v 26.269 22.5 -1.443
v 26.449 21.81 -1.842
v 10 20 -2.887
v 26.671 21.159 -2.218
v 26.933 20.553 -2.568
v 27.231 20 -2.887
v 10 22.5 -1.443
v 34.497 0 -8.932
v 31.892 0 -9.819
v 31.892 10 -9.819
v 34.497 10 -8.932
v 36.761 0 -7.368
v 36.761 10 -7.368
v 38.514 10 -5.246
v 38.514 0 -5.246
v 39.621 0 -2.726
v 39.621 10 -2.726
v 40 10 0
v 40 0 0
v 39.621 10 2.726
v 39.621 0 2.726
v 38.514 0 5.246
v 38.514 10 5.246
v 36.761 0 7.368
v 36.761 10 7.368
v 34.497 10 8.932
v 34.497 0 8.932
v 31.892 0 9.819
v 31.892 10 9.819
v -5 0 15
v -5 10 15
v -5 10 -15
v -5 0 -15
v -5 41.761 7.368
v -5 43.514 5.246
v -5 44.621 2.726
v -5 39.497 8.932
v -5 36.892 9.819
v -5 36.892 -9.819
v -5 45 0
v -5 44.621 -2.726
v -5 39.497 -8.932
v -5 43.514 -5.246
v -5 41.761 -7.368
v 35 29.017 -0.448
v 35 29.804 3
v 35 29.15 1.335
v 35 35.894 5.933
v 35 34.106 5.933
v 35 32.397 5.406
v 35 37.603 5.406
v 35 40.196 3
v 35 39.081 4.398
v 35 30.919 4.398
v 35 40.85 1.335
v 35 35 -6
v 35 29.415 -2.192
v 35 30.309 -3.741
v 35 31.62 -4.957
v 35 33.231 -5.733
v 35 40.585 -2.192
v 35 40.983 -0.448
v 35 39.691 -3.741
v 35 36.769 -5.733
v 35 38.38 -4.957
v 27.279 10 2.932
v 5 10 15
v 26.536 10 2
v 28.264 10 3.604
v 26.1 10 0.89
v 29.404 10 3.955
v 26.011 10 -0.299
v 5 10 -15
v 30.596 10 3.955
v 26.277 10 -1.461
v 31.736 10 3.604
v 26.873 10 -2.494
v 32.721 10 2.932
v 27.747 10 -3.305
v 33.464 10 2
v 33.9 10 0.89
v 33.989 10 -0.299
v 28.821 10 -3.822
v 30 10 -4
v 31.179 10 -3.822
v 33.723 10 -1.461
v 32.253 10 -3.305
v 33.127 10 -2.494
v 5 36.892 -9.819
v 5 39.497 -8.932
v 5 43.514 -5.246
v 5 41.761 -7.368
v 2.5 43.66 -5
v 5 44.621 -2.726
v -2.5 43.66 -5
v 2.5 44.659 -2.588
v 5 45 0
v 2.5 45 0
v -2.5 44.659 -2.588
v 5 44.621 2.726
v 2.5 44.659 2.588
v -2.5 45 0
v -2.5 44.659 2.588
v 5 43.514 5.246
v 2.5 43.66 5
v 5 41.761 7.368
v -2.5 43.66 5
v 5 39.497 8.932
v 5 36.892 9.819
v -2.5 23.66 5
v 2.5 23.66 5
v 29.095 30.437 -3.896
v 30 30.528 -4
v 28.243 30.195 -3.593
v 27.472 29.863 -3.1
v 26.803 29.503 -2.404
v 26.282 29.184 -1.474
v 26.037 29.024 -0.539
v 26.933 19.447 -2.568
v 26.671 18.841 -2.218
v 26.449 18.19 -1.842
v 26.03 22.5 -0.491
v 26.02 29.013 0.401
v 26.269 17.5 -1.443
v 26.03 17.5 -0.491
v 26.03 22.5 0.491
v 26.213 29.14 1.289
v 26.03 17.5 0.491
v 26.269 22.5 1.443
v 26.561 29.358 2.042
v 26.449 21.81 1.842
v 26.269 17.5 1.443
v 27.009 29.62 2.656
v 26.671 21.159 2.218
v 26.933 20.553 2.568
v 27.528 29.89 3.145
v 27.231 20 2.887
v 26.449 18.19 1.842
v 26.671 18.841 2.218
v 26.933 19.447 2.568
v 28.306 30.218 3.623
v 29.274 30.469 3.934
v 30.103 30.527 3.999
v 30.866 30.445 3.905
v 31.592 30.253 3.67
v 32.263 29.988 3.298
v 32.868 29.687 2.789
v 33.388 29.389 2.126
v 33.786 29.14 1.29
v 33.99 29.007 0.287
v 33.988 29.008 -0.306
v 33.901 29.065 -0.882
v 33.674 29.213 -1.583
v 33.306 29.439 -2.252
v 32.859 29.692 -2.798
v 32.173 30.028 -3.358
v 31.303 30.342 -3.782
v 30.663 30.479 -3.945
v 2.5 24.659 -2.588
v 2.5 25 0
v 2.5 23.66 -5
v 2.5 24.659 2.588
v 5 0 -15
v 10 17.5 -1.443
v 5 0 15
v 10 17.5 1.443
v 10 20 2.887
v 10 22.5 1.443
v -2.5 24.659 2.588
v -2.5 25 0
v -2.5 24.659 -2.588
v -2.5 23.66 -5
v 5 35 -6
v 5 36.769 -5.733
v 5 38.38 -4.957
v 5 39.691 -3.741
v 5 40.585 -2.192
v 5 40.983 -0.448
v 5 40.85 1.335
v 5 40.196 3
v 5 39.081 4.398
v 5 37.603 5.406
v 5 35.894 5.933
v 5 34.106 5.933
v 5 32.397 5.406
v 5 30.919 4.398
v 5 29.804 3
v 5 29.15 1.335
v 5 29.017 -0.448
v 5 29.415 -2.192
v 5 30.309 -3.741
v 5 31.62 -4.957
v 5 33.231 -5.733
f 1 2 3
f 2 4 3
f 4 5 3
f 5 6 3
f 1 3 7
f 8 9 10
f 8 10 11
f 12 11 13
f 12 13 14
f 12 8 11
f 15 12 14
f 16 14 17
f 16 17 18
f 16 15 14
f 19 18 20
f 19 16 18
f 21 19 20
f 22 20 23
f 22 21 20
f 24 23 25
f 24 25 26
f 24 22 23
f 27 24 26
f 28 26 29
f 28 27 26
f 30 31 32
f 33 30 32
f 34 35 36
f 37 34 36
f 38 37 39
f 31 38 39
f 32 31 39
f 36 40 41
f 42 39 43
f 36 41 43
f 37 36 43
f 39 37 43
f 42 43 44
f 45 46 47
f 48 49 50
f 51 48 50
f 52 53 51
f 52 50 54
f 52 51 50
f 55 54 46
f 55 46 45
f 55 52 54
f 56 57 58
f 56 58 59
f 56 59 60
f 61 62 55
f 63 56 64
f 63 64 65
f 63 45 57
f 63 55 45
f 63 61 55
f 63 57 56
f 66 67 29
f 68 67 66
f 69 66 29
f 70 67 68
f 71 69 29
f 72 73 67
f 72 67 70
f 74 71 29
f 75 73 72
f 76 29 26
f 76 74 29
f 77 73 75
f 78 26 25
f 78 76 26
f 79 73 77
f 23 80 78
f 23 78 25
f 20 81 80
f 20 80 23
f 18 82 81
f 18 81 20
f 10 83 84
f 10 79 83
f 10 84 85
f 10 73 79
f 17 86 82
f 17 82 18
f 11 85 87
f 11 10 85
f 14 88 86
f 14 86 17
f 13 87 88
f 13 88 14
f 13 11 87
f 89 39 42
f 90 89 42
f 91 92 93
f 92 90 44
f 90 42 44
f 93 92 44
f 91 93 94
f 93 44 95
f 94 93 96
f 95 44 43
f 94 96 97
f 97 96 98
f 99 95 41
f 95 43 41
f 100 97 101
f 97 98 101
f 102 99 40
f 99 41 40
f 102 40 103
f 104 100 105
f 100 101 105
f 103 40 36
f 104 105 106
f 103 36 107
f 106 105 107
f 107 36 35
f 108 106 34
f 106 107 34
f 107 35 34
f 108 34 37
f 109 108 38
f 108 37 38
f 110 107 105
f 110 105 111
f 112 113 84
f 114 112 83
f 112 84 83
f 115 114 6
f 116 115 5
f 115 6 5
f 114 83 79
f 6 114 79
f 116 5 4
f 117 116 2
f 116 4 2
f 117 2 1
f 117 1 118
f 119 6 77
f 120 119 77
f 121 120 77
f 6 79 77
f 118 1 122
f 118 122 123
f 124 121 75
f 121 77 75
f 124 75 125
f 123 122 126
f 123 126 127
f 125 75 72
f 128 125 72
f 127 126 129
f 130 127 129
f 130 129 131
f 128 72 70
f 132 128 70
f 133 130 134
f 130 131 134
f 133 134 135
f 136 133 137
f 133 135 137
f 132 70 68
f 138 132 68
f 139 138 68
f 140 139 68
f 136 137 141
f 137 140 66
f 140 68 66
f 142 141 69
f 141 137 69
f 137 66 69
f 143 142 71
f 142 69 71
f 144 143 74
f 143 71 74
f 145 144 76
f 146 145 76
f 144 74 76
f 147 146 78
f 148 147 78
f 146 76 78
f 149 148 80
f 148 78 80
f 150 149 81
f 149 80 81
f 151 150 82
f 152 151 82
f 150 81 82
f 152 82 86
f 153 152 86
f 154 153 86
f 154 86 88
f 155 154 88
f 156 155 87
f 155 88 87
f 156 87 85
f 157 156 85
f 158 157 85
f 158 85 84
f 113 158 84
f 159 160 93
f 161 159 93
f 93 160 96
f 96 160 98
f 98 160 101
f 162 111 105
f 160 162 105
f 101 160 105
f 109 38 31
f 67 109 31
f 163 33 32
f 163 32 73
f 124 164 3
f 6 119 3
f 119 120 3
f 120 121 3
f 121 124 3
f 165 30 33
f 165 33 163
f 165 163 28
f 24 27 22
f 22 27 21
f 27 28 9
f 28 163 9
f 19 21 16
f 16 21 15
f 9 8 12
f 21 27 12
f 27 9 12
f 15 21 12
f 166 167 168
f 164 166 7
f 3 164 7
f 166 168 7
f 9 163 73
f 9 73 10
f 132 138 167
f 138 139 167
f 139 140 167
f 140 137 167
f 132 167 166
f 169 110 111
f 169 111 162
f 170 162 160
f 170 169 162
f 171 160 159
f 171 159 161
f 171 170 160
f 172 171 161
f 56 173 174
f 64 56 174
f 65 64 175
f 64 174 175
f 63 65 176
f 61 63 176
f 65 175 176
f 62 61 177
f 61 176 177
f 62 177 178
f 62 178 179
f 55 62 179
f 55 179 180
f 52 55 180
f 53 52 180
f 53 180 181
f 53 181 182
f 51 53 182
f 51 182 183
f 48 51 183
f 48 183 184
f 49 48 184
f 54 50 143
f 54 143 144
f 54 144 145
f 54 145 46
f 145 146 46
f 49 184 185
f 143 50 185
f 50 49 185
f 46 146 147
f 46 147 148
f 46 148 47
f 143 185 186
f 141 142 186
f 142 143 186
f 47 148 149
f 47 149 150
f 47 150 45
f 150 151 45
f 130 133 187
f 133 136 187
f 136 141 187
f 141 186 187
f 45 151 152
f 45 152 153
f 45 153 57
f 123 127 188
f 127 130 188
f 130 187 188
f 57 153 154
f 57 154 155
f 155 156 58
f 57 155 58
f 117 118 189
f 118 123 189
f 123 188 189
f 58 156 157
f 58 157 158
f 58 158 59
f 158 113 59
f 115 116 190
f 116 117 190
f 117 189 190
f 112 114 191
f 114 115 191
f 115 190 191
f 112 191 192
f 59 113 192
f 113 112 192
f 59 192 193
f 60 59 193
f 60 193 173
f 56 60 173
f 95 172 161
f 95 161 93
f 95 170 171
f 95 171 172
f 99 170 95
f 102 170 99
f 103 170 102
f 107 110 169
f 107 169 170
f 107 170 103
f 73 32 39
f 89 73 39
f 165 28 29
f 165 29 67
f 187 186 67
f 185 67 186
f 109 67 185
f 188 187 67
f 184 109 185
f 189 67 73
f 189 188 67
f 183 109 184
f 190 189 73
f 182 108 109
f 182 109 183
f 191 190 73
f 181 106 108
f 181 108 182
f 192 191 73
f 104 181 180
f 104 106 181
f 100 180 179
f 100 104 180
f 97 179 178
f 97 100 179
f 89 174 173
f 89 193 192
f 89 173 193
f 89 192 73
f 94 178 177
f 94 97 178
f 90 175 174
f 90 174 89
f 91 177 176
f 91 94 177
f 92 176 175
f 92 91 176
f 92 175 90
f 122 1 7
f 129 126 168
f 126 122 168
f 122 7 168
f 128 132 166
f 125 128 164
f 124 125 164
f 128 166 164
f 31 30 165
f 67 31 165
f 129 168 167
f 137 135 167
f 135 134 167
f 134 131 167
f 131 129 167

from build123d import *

# Parameters (mm, degrees)
SKETCH1_W                = 10
SKETCH1_H                = 30
BOSS_EXTRUDE1_DEPTH      = 10
BOSS_EXTRUDE2_DEPTH      = 10
SKETCH4_R                = 6
BOSS_EXTRUDE3_DEPTH      = 30
BOSS_EXTRUDE4_REACH      = 57.227
BOSS_EXTRUDE4_END_RADIUS = 6
SKETCH5_R                = 4
BOSS_EXTRUDE5_REACH      = 60.949
BOSS_EXTRUDE5_END_RADIUS = 4
SKETCH7_W                = 9.610963381
SKETCH7_H                = 7.741253353
CUT_EXTRUDE1_DEPTH       = 5
CUT_EXTRUDE2_START       = -2.5
CUT_EXTRUDE2_DEPTH       = 5


# Read off the part's stored shape, not the designer's step: Cut-Extrude2
with BuildPart() as part:
    # Sketch1 → Boss-Extrude1 (new body)
    with BuildSketch(Plane(origin=(0, 0, 0), x_dir=(1, 0, 0), z_dir=(0, 1, 0))):
        Rectangle(SKETCH1_W, SKETCH1_H)
        with BuildLine():
            ThreePointArc((31.891669625, 9.819449375), (40, 0), (31.891669625, -9.819449375))
            Line((31.891669625, -9.819449375), (5, -15))
            Line((5, -15), (5, 15))
            Line((5, 15), (31.891669625, 9.819449375))
        make_face()
    extrude(amount=BOSS_EXTRUDE1_DEPTH)

    # Sketch2 → Boss-Extrude2 (add)
    with BuildSketch(Plane.ZY.offset(5)):
        with BuildLine():
            Line((-15, 10), (-9.819449375, 36.891669625))
            ThreePointArc((-9.819449375, 36.891669625), (0, 45), (9.819449375, 36.891669625))
            Line((9.819449375, 36.891669625), (15, 10))
            Line((15, 10), (-15, 10))
        make_face()
    extrude(amount=-BOSS_EXTRUDE2_DEPTH)

    # Sketch4 → Boss-Extrude3 (add)
    with BuildSketch(Plane(origin=(5, 0, 0), x_dir=(0, 0, -1), z_dir=(1, 0, 0))):
        with Locations((0, 35)):
            Circle(SKETCH4_R)
    extrude(amount=BOSS_EXTRUDE3_DEPTH)

    # Boss-Extrude4: up to this cylinder (the profile starts outside it)
    boss_extrude4_end = Plane(origin=(30, 35, 0), z_dir=(-1, 0, 0)) * Cylinder(BOSS_EXTRUDE4_END_RADIUS, 127.454, mode=Mode.PRIVATE)
    # Sketch5 → Boss-Extrude4 (add, up to the surface)
    with BuildSketch(Plane(origin=(0, 10, 0), x_dir=(1, 0, 0), z_dir=(0, 1, 0)), mode=Mode.PRIVATE) as boss_extrude4_sk1:
        with Locations(Location((30, 0, 0), (0, 0, 90))):
            Circle(SKETCH5_R)
    boss_extrude4_tool1 = extrude(boss_extrude4_sk1.sketch, amount=BOSS_EXTRUDE4_REACH, mode=Mode.PRIVATE) - boss_extrude4_end
    add(boss_extrude4_tool1.solids().sort_by_distance((30, 10, 0))[0])

    # Boss-Extrude5: up to this cylinder (the profile starts outside it)
    boss_extrude5_end = Plane(origin=(30, 20, 0), z_dir=(0, -1, 0)) * Cylinder(BOSS_EXTRUDE5_END_RADIUS, 130.898, mode=Mode.PRIVATE)
    # Sketch6 → Boss-Extrude5 (add, up to the surface)
    with BuildSketch(Plane(origin=(5, 0, 0), x_dir=(0, 0, -1), z_dir=(1, 0, 0)), mode=Mode.PRIVATE) as boss_extrude5_sk1:
        Polygon((-1.443375673, 22.5), (-2.886751346, 20), (-1.443375673, 17.5), (1.443375673, 17.5), (2.886751346, 20), (1.443375673, 22.5), align=None)
    boss_extrude5_tool1 = extrude(boss_extrude5_sk1.sketch, amount=BOSS_EXTRUDE5_REACH, mode=Mode.PRIVATE) - boss_extrude5_end
    add(boss_extrude5_tool1.solids().sort_by_distance((5, 20, 0))[0])

    # Sketch7 → Cut-Extrude1 (cut)
    with BuildSketch(Plane(origin=(5, 0, 0), x_dir=(0, 0, -1), z_dir=(1, 0, 0))):
        with Locations((0.16655936, 19.575208137)):
            Rectangle(SKETCH7_W, SKETCH7_H)
    extrude(amount=CUT_EXTRUDE1_DEPTH, mode=Mode.SUBTRACT)

    # Cut-Extrude2 outline → Cut-Extrude2 (cut)
    with BuildSketch(Plane.YZ.offset(CUT_EXTRUDE2_START)):
        with BuildLine():
            Line((43.660254038, 5), (23.660254038, 5))
            ThreePointArc((23.660254038, 5), (25, 0), (23.660254038, -5))
            Line((23.660254038, -5), (43.660254038, -5))
            ThreePointArc((43.660254038, -5), (45, 0), (43.660254038, 5))
        make_face()
    extrude(amount=CUT_EXTRUDE2_DEPTH, mode=Mode.SUBTRACT)


solid = part.part
